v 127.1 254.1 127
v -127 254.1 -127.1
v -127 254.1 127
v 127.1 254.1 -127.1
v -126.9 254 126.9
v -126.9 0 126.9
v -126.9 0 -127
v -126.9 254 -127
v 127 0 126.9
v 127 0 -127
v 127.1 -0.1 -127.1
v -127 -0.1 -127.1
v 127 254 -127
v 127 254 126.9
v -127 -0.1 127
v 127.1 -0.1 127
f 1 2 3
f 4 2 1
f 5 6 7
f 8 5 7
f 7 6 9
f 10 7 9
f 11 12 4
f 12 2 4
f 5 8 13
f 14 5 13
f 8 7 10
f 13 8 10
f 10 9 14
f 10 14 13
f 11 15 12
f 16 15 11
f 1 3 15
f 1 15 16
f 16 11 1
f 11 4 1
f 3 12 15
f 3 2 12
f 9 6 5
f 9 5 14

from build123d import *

# Parameters (mm, degrees)
SKETCH1_W           = 253.9
SKETCH1_H           = 253.9
BOSS_EXTRUDE1_DEPTH = 254
SKETCH3_W           = 254.1
SKETCH3_H           = 254.1
BOSS_EXTRUDE2_DEPTH = 0.1
SKETCH4_W           = 254.1
SKETCH4_H           = 254.1
BOSS_EXTRUDE3_DEPTH = 0.1


with BuildPart() as part:
    # Sketch1 → Boss-Extrude1 (new body)
    with BuildSketch(Plane(origin=(0, 0, 0), x_dir=(1, 0, 0), z_dir=(0, 1, 0))):
        Polygon((-127, 127.1), (127, 127.1), (127.1, 127.1), (127.1, 127), (127.1, -127), (127, -127), (-127, -127), (-127, 127), align=None)
        with Locations((0.05, 0.05)):
            Rectangle(SKETCH1_W, SKETCH1_H, mode=Mode.SUBTRACT)
    extrude(amount=BOSS_EXTRUDE1_DEPTH)

    # Sketch3 → Boss-Extrude2 (add)
    with BuildSketch(Plane(origin=(0, 254, 0), x_dir=(1, 0, 0), z_dir=(0, 1, 0))):
        with Locations((0.05, 0.05)):
            Rectangle(SKETCH3_W, SKETCH3_H)
    extrude(amount=BOSS_EXTRUDE2_DEPTH)

    # Sketch4 → Boss-Extrude3 (add)
    with BuildSketch(Plane.XZ):
        with Locations((0.05, -0.05)):
            Rectangle(SKETCH4_W, SKETCH4_H)
    extrude(amount=BOSS_EXTRUDE3_DEPTH)


solid = part.part
